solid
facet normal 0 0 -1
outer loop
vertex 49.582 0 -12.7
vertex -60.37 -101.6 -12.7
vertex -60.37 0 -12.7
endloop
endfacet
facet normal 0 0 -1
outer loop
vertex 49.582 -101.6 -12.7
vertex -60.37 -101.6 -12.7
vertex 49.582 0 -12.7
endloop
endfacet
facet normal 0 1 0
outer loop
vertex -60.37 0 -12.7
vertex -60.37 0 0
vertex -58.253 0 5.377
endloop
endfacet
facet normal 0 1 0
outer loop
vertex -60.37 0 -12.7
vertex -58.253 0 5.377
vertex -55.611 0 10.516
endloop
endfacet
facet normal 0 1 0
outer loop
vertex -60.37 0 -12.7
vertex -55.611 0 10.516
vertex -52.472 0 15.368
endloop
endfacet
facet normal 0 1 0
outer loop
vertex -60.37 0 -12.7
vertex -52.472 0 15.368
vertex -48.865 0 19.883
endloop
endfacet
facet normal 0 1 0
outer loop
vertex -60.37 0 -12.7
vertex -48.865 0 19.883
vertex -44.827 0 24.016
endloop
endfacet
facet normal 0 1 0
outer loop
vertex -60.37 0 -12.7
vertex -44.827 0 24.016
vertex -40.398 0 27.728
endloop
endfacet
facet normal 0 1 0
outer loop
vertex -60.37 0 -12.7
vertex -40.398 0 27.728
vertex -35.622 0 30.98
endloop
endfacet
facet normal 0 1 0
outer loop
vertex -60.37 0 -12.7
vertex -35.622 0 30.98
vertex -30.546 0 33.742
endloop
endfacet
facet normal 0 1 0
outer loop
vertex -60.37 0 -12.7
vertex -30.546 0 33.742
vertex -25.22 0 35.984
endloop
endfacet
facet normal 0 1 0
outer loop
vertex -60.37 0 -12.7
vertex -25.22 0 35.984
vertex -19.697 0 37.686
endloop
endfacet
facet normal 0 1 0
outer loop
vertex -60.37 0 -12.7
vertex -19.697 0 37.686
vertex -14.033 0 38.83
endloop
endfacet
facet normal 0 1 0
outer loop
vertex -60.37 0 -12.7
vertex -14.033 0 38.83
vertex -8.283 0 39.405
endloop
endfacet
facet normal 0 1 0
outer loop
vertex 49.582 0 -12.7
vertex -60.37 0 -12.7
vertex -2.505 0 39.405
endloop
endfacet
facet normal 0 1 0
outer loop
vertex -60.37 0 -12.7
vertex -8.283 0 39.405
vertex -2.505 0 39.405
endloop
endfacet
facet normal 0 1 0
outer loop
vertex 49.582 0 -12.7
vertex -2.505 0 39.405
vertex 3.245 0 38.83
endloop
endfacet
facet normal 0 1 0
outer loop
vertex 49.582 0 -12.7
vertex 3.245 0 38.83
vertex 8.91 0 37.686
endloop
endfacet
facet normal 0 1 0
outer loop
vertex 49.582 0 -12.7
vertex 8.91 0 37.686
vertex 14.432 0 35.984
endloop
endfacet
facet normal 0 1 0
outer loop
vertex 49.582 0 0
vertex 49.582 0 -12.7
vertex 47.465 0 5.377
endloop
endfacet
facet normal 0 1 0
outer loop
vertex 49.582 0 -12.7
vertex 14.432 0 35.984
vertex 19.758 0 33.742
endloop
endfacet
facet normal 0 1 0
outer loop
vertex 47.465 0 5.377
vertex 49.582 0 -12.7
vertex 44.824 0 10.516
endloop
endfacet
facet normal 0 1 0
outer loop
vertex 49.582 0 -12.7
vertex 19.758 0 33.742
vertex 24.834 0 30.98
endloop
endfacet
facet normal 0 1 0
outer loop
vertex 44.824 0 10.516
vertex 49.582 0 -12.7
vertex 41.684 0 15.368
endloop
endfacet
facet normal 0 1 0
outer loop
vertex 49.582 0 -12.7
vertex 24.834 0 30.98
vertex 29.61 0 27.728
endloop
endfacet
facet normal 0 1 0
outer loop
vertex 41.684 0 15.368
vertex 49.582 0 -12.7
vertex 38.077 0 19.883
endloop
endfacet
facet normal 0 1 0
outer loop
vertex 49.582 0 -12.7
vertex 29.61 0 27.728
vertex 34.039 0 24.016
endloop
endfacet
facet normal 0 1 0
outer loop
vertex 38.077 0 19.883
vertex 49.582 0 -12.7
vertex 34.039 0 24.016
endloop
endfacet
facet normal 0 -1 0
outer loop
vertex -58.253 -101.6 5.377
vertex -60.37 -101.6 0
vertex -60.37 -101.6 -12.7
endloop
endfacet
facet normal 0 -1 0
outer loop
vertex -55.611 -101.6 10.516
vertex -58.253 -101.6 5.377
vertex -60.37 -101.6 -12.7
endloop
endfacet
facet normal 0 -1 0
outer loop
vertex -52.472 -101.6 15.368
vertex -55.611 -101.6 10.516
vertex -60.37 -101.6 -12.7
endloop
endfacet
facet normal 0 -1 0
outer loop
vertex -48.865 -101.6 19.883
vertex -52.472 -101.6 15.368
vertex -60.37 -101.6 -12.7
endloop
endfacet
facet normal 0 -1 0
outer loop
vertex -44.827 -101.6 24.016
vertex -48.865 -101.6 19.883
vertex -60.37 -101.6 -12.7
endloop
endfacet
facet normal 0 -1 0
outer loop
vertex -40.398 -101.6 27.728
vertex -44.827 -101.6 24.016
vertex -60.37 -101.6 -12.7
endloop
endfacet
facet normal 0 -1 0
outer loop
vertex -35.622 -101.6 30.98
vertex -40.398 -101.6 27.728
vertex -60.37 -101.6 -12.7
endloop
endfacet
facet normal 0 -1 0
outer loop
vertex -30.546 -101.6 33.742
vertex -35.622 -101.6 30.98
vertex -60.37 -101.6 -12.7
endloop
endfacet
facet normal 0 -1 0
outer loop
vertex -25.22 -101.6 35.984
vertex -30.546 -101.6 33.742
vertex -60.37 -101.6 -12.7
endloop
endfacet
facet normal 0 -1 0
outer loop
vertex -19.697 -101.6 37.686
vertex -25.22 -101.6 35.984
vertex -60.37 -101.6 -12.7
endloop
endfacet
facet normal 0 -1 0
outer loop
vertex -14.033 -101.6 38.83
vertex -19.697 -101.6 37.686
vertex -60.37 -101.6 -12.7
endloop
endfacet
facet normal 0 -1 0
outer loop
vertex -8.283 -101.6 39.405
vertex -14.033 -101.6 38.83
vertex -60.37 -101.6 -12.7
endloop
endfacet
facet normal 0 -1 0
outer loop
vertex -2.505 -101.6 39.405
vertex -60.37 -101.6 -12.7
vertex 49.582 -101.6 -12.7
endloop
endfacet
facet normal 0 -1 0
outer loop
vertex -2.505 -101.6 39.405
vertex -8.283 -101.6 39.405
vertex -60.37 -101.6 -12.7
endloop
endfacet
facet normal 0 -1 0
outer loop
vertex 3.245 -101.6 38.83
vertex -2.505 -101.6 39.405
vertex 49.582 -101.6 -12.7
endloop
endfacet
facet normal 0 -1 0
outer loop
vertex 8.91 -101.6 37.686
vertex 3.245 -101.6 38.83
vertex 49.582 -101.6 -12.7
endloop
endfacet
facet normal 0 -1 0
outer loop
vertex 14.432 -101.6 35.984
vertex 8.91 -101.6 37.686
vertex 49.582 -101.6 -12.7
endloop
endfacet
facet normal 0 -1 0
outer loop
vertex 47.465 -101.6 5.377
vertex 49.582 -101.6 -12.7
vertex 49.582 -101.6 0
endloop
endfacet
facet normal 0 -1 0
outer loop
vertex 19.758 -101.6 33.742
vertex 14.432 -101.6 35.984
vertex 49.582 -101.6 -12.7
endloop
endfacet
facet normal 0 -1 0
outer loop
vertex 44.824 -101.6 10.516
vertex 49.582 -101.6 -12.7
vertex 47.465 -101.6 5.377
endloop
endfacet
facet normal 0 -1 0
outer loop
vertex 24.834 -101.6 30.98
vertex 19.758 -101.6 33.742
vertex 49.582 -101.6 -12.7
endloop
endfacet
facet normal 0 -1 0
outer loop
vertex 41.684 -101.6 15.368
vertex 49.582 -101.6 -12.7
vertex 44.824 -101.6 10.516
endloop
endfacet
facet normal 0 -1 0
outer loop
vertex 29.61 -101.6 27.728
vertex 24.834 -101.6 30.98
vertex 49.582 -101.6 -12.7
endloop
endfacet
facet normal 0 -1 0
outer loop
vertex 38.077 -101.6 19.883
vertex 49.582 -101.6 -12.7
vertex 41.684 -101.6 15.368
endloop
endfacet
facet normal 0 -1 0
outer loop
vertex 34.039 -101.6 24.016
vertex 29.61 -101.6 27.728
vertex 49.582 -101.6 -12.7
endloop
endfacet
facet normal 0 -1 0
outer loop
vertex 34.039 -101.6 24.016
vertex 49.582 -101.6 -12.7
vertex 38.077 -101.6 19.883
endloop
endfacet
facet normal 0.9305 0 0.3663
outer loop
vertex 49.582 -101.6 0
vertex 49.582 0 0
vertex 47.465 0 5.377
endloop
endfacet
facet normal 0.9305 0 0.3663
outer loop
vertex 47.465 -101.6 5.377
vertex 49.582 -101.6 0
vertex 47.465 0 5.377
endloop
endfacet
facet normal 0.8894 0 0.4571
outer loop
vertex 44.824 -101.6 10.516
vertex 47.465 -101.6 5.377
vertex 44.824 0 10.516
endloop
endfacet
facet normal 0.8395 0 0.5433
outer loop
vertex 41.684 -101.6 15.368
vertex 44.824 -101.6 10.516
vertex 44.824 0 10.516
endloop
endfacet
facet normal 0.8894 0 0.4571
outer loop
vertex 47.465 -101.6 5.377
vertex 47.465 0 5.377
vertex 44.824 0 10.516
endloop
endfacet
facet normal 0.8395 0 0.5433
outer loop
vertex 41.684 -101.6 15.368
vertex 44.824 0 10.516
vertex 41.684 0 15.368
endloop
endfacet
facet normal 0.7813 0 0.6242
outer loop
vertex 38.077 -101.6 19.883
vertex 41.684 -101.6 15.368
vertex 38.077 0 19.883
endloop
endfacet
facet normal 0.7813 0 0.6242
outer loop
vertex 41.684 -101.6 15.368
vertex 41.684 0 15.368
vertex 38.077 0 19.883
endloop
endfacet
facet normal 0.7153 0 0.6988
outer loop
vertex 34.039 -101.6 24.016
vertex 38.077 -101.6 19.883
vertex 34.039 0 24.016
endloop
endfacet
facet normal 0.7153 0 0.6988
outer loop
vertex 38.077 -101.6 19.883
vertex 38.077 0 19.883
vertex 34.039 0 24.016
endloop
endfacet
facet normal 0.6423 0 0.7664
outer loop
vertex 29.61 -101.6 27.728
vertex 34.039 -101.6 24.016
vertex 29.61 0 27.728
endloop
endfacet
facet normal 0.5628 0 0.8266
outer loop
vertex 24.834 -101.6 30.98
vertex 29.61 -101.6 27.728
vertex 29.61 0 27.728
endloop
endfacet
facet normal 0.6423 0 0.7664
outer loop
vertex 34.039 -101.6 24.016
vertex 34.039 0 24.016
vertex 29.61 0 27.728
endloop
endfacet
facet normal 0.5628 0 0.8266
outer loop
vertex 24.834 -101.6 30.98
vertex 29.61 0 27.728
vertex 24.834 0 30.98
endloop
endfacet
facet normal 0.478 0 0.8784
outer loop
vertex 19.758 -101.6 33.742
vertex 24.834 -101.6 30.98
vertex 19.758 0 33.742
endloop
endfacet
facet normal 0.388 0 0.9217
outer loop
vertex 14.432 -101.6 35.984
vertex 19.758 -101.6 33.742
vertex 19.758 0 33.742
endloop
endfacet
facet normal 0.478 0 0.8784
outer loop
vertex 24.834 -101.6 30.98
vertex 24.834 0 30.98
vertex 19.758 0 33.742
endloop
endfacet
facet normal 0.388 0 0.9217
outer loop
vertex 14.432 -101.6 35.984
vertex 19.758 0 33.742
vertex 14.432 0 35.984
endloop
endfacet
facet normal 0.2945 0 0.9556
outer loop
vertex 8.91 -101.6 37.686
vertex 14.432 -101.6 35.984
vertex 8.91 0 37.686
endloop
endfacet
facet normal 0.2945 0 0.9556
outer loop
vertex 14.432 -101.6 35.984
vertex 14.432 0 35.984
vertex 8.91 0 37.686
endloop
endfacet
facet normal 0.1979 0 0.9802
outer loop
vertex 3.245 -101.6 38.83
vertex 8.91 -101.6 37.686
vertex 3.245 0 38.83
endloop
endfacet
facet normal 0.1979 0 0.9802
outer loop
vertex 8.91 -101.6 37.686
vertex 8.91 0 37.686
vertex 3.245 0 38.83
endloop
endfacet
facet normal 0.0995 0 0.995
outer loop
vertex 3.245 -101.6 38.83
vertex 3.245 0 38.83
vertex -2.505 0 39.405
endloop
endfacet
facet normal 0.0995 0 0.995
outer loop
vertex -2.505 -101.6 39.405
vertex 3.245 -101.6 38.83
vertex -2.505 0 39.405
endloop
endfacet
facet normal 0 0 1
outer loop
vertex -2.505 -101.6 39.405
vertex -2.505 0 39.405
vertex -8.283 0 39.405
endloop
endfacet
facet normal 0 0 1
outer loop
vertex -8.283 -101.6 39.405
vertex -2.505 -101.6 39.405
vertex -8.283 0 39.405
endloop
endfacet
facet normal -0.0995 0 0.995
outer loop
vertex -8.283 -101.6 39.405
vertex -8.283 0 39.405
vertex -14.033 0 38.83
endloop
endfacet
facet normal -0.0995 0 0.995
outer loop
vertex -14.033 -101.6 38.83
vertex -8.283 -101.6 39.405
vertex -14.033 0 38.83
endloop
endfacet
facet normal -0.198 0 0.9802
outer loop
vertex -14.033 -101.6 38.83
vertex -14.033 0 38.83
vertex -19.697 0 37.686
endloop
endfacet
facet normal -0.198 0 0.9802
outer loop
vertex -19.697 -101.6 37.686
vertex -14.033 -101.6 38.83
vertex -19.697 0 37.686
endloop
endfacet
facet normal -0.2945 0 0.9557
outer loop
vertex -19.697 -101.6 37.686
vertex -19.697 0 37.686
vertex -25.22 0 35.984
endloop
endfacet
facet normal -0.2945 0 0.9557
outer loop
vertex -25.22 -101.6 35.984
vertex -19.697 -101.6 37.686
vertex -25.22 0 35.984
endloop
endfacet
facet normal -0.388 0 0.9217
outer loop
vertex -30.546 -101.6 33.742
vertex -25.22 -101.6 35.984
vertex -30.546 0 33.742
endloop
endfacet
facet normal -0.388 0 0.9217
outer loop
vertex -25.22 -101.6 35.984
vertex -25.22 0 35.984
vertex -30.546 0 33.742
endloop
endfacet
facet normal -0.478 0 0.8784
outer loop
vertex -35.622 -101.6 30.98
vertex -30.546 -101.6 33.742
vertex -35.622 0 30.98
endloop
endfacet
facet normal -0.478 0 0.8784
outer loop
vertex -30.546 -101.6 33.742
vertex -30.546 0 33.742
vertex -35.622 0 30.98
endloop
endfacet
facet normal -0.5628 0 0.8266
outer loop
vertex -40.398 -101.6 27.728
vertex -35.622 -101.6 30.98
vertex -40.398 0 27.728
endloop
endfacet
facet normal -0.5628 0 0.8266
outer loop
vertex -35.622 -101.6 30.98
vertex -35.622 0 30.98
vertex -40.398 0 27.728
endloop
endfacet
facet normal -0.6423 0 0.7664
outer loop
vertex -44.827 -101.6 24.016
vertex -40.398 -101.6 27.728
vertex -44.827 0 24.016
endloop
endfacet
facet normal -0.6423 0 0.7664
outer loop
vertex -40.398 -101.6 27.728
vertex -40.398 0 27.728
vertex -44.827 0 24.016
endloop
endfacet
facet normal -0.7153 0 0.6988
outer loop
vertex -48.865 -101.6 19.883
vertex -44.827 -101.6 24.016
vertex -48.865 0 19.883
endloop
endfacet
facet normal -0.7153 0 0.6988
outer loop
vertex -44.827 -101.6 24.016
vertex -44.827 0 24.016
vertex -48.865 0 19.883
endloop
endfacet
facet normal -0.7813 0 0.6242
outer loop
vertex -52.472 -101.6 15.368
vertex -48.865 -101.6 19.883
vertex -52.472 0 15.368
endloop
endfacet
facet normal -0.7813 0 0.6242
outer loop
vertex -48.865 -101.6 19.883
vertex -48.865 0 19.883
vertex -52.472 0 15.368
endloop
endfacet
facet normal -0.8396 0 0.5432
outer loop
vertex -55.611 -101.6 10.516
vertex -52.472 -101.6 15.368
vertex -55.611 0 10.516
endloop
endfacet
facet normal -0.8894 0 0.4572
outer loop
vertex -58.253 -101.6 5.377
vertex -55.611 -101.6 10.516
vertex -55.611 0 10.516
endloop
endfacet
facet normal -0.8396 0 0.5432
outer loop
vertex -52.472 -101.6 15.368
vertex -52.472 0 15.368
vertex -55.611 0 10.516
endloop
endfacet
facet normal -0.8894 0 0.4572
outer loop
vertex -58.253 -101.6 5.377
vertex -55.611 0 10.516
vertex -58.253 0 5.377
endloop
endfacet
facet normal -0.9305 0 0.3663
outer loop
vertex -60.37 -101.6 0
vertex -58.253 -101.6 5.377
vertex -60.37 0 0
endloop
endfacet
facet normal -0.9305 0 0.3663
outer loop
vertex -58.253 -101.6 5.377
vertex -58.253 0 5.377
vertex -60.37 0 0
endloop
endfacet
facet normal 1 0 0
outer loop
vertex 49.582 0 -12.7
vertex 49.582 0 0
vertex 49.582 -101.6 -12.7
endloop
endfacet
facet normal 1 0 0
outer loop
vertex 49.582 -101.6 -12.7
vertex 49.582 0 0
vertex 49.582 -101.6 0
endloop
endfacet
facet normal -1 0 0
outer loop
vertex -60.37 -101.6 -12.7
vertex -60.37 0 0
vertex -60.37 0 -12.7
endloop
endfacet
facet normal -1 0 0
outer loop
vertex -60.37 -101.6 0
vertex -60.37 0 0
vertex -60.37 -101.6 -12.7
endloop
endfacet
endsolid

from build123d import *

# Parameters (mm, degrees)
F1_DEPTH  = 101.6
F1_FACE_W = 109.95227
F1_FACE_H = 101.6
F2_DEPTH  = 12.7


with BuildPart() as f1:
    # F0 (on Front) → F1 (new body)
    with BuildSketch(Plane.XZ):
        with BuildLine():
            Line((-60.370058, 0), (49.582213, 0))
            ThreePointArc((49.582213, 0), (-5.393922, 39.476916), (-60.370058, 0))
        make_face()
    extrude(amount=F1_DEPTH)

    # F1_face (on face) → F2 (join)
    with BuildSketch(Plane(origin=(-5.393922, -50.8, 0), x_dir=(1, 0, 0), z_dir=(0, 0, -1))):
        Rectangle(F1_FACE_W, F1_FACE_H)
    extrude(amount=F2_DEPTH)


solid = f1.part
